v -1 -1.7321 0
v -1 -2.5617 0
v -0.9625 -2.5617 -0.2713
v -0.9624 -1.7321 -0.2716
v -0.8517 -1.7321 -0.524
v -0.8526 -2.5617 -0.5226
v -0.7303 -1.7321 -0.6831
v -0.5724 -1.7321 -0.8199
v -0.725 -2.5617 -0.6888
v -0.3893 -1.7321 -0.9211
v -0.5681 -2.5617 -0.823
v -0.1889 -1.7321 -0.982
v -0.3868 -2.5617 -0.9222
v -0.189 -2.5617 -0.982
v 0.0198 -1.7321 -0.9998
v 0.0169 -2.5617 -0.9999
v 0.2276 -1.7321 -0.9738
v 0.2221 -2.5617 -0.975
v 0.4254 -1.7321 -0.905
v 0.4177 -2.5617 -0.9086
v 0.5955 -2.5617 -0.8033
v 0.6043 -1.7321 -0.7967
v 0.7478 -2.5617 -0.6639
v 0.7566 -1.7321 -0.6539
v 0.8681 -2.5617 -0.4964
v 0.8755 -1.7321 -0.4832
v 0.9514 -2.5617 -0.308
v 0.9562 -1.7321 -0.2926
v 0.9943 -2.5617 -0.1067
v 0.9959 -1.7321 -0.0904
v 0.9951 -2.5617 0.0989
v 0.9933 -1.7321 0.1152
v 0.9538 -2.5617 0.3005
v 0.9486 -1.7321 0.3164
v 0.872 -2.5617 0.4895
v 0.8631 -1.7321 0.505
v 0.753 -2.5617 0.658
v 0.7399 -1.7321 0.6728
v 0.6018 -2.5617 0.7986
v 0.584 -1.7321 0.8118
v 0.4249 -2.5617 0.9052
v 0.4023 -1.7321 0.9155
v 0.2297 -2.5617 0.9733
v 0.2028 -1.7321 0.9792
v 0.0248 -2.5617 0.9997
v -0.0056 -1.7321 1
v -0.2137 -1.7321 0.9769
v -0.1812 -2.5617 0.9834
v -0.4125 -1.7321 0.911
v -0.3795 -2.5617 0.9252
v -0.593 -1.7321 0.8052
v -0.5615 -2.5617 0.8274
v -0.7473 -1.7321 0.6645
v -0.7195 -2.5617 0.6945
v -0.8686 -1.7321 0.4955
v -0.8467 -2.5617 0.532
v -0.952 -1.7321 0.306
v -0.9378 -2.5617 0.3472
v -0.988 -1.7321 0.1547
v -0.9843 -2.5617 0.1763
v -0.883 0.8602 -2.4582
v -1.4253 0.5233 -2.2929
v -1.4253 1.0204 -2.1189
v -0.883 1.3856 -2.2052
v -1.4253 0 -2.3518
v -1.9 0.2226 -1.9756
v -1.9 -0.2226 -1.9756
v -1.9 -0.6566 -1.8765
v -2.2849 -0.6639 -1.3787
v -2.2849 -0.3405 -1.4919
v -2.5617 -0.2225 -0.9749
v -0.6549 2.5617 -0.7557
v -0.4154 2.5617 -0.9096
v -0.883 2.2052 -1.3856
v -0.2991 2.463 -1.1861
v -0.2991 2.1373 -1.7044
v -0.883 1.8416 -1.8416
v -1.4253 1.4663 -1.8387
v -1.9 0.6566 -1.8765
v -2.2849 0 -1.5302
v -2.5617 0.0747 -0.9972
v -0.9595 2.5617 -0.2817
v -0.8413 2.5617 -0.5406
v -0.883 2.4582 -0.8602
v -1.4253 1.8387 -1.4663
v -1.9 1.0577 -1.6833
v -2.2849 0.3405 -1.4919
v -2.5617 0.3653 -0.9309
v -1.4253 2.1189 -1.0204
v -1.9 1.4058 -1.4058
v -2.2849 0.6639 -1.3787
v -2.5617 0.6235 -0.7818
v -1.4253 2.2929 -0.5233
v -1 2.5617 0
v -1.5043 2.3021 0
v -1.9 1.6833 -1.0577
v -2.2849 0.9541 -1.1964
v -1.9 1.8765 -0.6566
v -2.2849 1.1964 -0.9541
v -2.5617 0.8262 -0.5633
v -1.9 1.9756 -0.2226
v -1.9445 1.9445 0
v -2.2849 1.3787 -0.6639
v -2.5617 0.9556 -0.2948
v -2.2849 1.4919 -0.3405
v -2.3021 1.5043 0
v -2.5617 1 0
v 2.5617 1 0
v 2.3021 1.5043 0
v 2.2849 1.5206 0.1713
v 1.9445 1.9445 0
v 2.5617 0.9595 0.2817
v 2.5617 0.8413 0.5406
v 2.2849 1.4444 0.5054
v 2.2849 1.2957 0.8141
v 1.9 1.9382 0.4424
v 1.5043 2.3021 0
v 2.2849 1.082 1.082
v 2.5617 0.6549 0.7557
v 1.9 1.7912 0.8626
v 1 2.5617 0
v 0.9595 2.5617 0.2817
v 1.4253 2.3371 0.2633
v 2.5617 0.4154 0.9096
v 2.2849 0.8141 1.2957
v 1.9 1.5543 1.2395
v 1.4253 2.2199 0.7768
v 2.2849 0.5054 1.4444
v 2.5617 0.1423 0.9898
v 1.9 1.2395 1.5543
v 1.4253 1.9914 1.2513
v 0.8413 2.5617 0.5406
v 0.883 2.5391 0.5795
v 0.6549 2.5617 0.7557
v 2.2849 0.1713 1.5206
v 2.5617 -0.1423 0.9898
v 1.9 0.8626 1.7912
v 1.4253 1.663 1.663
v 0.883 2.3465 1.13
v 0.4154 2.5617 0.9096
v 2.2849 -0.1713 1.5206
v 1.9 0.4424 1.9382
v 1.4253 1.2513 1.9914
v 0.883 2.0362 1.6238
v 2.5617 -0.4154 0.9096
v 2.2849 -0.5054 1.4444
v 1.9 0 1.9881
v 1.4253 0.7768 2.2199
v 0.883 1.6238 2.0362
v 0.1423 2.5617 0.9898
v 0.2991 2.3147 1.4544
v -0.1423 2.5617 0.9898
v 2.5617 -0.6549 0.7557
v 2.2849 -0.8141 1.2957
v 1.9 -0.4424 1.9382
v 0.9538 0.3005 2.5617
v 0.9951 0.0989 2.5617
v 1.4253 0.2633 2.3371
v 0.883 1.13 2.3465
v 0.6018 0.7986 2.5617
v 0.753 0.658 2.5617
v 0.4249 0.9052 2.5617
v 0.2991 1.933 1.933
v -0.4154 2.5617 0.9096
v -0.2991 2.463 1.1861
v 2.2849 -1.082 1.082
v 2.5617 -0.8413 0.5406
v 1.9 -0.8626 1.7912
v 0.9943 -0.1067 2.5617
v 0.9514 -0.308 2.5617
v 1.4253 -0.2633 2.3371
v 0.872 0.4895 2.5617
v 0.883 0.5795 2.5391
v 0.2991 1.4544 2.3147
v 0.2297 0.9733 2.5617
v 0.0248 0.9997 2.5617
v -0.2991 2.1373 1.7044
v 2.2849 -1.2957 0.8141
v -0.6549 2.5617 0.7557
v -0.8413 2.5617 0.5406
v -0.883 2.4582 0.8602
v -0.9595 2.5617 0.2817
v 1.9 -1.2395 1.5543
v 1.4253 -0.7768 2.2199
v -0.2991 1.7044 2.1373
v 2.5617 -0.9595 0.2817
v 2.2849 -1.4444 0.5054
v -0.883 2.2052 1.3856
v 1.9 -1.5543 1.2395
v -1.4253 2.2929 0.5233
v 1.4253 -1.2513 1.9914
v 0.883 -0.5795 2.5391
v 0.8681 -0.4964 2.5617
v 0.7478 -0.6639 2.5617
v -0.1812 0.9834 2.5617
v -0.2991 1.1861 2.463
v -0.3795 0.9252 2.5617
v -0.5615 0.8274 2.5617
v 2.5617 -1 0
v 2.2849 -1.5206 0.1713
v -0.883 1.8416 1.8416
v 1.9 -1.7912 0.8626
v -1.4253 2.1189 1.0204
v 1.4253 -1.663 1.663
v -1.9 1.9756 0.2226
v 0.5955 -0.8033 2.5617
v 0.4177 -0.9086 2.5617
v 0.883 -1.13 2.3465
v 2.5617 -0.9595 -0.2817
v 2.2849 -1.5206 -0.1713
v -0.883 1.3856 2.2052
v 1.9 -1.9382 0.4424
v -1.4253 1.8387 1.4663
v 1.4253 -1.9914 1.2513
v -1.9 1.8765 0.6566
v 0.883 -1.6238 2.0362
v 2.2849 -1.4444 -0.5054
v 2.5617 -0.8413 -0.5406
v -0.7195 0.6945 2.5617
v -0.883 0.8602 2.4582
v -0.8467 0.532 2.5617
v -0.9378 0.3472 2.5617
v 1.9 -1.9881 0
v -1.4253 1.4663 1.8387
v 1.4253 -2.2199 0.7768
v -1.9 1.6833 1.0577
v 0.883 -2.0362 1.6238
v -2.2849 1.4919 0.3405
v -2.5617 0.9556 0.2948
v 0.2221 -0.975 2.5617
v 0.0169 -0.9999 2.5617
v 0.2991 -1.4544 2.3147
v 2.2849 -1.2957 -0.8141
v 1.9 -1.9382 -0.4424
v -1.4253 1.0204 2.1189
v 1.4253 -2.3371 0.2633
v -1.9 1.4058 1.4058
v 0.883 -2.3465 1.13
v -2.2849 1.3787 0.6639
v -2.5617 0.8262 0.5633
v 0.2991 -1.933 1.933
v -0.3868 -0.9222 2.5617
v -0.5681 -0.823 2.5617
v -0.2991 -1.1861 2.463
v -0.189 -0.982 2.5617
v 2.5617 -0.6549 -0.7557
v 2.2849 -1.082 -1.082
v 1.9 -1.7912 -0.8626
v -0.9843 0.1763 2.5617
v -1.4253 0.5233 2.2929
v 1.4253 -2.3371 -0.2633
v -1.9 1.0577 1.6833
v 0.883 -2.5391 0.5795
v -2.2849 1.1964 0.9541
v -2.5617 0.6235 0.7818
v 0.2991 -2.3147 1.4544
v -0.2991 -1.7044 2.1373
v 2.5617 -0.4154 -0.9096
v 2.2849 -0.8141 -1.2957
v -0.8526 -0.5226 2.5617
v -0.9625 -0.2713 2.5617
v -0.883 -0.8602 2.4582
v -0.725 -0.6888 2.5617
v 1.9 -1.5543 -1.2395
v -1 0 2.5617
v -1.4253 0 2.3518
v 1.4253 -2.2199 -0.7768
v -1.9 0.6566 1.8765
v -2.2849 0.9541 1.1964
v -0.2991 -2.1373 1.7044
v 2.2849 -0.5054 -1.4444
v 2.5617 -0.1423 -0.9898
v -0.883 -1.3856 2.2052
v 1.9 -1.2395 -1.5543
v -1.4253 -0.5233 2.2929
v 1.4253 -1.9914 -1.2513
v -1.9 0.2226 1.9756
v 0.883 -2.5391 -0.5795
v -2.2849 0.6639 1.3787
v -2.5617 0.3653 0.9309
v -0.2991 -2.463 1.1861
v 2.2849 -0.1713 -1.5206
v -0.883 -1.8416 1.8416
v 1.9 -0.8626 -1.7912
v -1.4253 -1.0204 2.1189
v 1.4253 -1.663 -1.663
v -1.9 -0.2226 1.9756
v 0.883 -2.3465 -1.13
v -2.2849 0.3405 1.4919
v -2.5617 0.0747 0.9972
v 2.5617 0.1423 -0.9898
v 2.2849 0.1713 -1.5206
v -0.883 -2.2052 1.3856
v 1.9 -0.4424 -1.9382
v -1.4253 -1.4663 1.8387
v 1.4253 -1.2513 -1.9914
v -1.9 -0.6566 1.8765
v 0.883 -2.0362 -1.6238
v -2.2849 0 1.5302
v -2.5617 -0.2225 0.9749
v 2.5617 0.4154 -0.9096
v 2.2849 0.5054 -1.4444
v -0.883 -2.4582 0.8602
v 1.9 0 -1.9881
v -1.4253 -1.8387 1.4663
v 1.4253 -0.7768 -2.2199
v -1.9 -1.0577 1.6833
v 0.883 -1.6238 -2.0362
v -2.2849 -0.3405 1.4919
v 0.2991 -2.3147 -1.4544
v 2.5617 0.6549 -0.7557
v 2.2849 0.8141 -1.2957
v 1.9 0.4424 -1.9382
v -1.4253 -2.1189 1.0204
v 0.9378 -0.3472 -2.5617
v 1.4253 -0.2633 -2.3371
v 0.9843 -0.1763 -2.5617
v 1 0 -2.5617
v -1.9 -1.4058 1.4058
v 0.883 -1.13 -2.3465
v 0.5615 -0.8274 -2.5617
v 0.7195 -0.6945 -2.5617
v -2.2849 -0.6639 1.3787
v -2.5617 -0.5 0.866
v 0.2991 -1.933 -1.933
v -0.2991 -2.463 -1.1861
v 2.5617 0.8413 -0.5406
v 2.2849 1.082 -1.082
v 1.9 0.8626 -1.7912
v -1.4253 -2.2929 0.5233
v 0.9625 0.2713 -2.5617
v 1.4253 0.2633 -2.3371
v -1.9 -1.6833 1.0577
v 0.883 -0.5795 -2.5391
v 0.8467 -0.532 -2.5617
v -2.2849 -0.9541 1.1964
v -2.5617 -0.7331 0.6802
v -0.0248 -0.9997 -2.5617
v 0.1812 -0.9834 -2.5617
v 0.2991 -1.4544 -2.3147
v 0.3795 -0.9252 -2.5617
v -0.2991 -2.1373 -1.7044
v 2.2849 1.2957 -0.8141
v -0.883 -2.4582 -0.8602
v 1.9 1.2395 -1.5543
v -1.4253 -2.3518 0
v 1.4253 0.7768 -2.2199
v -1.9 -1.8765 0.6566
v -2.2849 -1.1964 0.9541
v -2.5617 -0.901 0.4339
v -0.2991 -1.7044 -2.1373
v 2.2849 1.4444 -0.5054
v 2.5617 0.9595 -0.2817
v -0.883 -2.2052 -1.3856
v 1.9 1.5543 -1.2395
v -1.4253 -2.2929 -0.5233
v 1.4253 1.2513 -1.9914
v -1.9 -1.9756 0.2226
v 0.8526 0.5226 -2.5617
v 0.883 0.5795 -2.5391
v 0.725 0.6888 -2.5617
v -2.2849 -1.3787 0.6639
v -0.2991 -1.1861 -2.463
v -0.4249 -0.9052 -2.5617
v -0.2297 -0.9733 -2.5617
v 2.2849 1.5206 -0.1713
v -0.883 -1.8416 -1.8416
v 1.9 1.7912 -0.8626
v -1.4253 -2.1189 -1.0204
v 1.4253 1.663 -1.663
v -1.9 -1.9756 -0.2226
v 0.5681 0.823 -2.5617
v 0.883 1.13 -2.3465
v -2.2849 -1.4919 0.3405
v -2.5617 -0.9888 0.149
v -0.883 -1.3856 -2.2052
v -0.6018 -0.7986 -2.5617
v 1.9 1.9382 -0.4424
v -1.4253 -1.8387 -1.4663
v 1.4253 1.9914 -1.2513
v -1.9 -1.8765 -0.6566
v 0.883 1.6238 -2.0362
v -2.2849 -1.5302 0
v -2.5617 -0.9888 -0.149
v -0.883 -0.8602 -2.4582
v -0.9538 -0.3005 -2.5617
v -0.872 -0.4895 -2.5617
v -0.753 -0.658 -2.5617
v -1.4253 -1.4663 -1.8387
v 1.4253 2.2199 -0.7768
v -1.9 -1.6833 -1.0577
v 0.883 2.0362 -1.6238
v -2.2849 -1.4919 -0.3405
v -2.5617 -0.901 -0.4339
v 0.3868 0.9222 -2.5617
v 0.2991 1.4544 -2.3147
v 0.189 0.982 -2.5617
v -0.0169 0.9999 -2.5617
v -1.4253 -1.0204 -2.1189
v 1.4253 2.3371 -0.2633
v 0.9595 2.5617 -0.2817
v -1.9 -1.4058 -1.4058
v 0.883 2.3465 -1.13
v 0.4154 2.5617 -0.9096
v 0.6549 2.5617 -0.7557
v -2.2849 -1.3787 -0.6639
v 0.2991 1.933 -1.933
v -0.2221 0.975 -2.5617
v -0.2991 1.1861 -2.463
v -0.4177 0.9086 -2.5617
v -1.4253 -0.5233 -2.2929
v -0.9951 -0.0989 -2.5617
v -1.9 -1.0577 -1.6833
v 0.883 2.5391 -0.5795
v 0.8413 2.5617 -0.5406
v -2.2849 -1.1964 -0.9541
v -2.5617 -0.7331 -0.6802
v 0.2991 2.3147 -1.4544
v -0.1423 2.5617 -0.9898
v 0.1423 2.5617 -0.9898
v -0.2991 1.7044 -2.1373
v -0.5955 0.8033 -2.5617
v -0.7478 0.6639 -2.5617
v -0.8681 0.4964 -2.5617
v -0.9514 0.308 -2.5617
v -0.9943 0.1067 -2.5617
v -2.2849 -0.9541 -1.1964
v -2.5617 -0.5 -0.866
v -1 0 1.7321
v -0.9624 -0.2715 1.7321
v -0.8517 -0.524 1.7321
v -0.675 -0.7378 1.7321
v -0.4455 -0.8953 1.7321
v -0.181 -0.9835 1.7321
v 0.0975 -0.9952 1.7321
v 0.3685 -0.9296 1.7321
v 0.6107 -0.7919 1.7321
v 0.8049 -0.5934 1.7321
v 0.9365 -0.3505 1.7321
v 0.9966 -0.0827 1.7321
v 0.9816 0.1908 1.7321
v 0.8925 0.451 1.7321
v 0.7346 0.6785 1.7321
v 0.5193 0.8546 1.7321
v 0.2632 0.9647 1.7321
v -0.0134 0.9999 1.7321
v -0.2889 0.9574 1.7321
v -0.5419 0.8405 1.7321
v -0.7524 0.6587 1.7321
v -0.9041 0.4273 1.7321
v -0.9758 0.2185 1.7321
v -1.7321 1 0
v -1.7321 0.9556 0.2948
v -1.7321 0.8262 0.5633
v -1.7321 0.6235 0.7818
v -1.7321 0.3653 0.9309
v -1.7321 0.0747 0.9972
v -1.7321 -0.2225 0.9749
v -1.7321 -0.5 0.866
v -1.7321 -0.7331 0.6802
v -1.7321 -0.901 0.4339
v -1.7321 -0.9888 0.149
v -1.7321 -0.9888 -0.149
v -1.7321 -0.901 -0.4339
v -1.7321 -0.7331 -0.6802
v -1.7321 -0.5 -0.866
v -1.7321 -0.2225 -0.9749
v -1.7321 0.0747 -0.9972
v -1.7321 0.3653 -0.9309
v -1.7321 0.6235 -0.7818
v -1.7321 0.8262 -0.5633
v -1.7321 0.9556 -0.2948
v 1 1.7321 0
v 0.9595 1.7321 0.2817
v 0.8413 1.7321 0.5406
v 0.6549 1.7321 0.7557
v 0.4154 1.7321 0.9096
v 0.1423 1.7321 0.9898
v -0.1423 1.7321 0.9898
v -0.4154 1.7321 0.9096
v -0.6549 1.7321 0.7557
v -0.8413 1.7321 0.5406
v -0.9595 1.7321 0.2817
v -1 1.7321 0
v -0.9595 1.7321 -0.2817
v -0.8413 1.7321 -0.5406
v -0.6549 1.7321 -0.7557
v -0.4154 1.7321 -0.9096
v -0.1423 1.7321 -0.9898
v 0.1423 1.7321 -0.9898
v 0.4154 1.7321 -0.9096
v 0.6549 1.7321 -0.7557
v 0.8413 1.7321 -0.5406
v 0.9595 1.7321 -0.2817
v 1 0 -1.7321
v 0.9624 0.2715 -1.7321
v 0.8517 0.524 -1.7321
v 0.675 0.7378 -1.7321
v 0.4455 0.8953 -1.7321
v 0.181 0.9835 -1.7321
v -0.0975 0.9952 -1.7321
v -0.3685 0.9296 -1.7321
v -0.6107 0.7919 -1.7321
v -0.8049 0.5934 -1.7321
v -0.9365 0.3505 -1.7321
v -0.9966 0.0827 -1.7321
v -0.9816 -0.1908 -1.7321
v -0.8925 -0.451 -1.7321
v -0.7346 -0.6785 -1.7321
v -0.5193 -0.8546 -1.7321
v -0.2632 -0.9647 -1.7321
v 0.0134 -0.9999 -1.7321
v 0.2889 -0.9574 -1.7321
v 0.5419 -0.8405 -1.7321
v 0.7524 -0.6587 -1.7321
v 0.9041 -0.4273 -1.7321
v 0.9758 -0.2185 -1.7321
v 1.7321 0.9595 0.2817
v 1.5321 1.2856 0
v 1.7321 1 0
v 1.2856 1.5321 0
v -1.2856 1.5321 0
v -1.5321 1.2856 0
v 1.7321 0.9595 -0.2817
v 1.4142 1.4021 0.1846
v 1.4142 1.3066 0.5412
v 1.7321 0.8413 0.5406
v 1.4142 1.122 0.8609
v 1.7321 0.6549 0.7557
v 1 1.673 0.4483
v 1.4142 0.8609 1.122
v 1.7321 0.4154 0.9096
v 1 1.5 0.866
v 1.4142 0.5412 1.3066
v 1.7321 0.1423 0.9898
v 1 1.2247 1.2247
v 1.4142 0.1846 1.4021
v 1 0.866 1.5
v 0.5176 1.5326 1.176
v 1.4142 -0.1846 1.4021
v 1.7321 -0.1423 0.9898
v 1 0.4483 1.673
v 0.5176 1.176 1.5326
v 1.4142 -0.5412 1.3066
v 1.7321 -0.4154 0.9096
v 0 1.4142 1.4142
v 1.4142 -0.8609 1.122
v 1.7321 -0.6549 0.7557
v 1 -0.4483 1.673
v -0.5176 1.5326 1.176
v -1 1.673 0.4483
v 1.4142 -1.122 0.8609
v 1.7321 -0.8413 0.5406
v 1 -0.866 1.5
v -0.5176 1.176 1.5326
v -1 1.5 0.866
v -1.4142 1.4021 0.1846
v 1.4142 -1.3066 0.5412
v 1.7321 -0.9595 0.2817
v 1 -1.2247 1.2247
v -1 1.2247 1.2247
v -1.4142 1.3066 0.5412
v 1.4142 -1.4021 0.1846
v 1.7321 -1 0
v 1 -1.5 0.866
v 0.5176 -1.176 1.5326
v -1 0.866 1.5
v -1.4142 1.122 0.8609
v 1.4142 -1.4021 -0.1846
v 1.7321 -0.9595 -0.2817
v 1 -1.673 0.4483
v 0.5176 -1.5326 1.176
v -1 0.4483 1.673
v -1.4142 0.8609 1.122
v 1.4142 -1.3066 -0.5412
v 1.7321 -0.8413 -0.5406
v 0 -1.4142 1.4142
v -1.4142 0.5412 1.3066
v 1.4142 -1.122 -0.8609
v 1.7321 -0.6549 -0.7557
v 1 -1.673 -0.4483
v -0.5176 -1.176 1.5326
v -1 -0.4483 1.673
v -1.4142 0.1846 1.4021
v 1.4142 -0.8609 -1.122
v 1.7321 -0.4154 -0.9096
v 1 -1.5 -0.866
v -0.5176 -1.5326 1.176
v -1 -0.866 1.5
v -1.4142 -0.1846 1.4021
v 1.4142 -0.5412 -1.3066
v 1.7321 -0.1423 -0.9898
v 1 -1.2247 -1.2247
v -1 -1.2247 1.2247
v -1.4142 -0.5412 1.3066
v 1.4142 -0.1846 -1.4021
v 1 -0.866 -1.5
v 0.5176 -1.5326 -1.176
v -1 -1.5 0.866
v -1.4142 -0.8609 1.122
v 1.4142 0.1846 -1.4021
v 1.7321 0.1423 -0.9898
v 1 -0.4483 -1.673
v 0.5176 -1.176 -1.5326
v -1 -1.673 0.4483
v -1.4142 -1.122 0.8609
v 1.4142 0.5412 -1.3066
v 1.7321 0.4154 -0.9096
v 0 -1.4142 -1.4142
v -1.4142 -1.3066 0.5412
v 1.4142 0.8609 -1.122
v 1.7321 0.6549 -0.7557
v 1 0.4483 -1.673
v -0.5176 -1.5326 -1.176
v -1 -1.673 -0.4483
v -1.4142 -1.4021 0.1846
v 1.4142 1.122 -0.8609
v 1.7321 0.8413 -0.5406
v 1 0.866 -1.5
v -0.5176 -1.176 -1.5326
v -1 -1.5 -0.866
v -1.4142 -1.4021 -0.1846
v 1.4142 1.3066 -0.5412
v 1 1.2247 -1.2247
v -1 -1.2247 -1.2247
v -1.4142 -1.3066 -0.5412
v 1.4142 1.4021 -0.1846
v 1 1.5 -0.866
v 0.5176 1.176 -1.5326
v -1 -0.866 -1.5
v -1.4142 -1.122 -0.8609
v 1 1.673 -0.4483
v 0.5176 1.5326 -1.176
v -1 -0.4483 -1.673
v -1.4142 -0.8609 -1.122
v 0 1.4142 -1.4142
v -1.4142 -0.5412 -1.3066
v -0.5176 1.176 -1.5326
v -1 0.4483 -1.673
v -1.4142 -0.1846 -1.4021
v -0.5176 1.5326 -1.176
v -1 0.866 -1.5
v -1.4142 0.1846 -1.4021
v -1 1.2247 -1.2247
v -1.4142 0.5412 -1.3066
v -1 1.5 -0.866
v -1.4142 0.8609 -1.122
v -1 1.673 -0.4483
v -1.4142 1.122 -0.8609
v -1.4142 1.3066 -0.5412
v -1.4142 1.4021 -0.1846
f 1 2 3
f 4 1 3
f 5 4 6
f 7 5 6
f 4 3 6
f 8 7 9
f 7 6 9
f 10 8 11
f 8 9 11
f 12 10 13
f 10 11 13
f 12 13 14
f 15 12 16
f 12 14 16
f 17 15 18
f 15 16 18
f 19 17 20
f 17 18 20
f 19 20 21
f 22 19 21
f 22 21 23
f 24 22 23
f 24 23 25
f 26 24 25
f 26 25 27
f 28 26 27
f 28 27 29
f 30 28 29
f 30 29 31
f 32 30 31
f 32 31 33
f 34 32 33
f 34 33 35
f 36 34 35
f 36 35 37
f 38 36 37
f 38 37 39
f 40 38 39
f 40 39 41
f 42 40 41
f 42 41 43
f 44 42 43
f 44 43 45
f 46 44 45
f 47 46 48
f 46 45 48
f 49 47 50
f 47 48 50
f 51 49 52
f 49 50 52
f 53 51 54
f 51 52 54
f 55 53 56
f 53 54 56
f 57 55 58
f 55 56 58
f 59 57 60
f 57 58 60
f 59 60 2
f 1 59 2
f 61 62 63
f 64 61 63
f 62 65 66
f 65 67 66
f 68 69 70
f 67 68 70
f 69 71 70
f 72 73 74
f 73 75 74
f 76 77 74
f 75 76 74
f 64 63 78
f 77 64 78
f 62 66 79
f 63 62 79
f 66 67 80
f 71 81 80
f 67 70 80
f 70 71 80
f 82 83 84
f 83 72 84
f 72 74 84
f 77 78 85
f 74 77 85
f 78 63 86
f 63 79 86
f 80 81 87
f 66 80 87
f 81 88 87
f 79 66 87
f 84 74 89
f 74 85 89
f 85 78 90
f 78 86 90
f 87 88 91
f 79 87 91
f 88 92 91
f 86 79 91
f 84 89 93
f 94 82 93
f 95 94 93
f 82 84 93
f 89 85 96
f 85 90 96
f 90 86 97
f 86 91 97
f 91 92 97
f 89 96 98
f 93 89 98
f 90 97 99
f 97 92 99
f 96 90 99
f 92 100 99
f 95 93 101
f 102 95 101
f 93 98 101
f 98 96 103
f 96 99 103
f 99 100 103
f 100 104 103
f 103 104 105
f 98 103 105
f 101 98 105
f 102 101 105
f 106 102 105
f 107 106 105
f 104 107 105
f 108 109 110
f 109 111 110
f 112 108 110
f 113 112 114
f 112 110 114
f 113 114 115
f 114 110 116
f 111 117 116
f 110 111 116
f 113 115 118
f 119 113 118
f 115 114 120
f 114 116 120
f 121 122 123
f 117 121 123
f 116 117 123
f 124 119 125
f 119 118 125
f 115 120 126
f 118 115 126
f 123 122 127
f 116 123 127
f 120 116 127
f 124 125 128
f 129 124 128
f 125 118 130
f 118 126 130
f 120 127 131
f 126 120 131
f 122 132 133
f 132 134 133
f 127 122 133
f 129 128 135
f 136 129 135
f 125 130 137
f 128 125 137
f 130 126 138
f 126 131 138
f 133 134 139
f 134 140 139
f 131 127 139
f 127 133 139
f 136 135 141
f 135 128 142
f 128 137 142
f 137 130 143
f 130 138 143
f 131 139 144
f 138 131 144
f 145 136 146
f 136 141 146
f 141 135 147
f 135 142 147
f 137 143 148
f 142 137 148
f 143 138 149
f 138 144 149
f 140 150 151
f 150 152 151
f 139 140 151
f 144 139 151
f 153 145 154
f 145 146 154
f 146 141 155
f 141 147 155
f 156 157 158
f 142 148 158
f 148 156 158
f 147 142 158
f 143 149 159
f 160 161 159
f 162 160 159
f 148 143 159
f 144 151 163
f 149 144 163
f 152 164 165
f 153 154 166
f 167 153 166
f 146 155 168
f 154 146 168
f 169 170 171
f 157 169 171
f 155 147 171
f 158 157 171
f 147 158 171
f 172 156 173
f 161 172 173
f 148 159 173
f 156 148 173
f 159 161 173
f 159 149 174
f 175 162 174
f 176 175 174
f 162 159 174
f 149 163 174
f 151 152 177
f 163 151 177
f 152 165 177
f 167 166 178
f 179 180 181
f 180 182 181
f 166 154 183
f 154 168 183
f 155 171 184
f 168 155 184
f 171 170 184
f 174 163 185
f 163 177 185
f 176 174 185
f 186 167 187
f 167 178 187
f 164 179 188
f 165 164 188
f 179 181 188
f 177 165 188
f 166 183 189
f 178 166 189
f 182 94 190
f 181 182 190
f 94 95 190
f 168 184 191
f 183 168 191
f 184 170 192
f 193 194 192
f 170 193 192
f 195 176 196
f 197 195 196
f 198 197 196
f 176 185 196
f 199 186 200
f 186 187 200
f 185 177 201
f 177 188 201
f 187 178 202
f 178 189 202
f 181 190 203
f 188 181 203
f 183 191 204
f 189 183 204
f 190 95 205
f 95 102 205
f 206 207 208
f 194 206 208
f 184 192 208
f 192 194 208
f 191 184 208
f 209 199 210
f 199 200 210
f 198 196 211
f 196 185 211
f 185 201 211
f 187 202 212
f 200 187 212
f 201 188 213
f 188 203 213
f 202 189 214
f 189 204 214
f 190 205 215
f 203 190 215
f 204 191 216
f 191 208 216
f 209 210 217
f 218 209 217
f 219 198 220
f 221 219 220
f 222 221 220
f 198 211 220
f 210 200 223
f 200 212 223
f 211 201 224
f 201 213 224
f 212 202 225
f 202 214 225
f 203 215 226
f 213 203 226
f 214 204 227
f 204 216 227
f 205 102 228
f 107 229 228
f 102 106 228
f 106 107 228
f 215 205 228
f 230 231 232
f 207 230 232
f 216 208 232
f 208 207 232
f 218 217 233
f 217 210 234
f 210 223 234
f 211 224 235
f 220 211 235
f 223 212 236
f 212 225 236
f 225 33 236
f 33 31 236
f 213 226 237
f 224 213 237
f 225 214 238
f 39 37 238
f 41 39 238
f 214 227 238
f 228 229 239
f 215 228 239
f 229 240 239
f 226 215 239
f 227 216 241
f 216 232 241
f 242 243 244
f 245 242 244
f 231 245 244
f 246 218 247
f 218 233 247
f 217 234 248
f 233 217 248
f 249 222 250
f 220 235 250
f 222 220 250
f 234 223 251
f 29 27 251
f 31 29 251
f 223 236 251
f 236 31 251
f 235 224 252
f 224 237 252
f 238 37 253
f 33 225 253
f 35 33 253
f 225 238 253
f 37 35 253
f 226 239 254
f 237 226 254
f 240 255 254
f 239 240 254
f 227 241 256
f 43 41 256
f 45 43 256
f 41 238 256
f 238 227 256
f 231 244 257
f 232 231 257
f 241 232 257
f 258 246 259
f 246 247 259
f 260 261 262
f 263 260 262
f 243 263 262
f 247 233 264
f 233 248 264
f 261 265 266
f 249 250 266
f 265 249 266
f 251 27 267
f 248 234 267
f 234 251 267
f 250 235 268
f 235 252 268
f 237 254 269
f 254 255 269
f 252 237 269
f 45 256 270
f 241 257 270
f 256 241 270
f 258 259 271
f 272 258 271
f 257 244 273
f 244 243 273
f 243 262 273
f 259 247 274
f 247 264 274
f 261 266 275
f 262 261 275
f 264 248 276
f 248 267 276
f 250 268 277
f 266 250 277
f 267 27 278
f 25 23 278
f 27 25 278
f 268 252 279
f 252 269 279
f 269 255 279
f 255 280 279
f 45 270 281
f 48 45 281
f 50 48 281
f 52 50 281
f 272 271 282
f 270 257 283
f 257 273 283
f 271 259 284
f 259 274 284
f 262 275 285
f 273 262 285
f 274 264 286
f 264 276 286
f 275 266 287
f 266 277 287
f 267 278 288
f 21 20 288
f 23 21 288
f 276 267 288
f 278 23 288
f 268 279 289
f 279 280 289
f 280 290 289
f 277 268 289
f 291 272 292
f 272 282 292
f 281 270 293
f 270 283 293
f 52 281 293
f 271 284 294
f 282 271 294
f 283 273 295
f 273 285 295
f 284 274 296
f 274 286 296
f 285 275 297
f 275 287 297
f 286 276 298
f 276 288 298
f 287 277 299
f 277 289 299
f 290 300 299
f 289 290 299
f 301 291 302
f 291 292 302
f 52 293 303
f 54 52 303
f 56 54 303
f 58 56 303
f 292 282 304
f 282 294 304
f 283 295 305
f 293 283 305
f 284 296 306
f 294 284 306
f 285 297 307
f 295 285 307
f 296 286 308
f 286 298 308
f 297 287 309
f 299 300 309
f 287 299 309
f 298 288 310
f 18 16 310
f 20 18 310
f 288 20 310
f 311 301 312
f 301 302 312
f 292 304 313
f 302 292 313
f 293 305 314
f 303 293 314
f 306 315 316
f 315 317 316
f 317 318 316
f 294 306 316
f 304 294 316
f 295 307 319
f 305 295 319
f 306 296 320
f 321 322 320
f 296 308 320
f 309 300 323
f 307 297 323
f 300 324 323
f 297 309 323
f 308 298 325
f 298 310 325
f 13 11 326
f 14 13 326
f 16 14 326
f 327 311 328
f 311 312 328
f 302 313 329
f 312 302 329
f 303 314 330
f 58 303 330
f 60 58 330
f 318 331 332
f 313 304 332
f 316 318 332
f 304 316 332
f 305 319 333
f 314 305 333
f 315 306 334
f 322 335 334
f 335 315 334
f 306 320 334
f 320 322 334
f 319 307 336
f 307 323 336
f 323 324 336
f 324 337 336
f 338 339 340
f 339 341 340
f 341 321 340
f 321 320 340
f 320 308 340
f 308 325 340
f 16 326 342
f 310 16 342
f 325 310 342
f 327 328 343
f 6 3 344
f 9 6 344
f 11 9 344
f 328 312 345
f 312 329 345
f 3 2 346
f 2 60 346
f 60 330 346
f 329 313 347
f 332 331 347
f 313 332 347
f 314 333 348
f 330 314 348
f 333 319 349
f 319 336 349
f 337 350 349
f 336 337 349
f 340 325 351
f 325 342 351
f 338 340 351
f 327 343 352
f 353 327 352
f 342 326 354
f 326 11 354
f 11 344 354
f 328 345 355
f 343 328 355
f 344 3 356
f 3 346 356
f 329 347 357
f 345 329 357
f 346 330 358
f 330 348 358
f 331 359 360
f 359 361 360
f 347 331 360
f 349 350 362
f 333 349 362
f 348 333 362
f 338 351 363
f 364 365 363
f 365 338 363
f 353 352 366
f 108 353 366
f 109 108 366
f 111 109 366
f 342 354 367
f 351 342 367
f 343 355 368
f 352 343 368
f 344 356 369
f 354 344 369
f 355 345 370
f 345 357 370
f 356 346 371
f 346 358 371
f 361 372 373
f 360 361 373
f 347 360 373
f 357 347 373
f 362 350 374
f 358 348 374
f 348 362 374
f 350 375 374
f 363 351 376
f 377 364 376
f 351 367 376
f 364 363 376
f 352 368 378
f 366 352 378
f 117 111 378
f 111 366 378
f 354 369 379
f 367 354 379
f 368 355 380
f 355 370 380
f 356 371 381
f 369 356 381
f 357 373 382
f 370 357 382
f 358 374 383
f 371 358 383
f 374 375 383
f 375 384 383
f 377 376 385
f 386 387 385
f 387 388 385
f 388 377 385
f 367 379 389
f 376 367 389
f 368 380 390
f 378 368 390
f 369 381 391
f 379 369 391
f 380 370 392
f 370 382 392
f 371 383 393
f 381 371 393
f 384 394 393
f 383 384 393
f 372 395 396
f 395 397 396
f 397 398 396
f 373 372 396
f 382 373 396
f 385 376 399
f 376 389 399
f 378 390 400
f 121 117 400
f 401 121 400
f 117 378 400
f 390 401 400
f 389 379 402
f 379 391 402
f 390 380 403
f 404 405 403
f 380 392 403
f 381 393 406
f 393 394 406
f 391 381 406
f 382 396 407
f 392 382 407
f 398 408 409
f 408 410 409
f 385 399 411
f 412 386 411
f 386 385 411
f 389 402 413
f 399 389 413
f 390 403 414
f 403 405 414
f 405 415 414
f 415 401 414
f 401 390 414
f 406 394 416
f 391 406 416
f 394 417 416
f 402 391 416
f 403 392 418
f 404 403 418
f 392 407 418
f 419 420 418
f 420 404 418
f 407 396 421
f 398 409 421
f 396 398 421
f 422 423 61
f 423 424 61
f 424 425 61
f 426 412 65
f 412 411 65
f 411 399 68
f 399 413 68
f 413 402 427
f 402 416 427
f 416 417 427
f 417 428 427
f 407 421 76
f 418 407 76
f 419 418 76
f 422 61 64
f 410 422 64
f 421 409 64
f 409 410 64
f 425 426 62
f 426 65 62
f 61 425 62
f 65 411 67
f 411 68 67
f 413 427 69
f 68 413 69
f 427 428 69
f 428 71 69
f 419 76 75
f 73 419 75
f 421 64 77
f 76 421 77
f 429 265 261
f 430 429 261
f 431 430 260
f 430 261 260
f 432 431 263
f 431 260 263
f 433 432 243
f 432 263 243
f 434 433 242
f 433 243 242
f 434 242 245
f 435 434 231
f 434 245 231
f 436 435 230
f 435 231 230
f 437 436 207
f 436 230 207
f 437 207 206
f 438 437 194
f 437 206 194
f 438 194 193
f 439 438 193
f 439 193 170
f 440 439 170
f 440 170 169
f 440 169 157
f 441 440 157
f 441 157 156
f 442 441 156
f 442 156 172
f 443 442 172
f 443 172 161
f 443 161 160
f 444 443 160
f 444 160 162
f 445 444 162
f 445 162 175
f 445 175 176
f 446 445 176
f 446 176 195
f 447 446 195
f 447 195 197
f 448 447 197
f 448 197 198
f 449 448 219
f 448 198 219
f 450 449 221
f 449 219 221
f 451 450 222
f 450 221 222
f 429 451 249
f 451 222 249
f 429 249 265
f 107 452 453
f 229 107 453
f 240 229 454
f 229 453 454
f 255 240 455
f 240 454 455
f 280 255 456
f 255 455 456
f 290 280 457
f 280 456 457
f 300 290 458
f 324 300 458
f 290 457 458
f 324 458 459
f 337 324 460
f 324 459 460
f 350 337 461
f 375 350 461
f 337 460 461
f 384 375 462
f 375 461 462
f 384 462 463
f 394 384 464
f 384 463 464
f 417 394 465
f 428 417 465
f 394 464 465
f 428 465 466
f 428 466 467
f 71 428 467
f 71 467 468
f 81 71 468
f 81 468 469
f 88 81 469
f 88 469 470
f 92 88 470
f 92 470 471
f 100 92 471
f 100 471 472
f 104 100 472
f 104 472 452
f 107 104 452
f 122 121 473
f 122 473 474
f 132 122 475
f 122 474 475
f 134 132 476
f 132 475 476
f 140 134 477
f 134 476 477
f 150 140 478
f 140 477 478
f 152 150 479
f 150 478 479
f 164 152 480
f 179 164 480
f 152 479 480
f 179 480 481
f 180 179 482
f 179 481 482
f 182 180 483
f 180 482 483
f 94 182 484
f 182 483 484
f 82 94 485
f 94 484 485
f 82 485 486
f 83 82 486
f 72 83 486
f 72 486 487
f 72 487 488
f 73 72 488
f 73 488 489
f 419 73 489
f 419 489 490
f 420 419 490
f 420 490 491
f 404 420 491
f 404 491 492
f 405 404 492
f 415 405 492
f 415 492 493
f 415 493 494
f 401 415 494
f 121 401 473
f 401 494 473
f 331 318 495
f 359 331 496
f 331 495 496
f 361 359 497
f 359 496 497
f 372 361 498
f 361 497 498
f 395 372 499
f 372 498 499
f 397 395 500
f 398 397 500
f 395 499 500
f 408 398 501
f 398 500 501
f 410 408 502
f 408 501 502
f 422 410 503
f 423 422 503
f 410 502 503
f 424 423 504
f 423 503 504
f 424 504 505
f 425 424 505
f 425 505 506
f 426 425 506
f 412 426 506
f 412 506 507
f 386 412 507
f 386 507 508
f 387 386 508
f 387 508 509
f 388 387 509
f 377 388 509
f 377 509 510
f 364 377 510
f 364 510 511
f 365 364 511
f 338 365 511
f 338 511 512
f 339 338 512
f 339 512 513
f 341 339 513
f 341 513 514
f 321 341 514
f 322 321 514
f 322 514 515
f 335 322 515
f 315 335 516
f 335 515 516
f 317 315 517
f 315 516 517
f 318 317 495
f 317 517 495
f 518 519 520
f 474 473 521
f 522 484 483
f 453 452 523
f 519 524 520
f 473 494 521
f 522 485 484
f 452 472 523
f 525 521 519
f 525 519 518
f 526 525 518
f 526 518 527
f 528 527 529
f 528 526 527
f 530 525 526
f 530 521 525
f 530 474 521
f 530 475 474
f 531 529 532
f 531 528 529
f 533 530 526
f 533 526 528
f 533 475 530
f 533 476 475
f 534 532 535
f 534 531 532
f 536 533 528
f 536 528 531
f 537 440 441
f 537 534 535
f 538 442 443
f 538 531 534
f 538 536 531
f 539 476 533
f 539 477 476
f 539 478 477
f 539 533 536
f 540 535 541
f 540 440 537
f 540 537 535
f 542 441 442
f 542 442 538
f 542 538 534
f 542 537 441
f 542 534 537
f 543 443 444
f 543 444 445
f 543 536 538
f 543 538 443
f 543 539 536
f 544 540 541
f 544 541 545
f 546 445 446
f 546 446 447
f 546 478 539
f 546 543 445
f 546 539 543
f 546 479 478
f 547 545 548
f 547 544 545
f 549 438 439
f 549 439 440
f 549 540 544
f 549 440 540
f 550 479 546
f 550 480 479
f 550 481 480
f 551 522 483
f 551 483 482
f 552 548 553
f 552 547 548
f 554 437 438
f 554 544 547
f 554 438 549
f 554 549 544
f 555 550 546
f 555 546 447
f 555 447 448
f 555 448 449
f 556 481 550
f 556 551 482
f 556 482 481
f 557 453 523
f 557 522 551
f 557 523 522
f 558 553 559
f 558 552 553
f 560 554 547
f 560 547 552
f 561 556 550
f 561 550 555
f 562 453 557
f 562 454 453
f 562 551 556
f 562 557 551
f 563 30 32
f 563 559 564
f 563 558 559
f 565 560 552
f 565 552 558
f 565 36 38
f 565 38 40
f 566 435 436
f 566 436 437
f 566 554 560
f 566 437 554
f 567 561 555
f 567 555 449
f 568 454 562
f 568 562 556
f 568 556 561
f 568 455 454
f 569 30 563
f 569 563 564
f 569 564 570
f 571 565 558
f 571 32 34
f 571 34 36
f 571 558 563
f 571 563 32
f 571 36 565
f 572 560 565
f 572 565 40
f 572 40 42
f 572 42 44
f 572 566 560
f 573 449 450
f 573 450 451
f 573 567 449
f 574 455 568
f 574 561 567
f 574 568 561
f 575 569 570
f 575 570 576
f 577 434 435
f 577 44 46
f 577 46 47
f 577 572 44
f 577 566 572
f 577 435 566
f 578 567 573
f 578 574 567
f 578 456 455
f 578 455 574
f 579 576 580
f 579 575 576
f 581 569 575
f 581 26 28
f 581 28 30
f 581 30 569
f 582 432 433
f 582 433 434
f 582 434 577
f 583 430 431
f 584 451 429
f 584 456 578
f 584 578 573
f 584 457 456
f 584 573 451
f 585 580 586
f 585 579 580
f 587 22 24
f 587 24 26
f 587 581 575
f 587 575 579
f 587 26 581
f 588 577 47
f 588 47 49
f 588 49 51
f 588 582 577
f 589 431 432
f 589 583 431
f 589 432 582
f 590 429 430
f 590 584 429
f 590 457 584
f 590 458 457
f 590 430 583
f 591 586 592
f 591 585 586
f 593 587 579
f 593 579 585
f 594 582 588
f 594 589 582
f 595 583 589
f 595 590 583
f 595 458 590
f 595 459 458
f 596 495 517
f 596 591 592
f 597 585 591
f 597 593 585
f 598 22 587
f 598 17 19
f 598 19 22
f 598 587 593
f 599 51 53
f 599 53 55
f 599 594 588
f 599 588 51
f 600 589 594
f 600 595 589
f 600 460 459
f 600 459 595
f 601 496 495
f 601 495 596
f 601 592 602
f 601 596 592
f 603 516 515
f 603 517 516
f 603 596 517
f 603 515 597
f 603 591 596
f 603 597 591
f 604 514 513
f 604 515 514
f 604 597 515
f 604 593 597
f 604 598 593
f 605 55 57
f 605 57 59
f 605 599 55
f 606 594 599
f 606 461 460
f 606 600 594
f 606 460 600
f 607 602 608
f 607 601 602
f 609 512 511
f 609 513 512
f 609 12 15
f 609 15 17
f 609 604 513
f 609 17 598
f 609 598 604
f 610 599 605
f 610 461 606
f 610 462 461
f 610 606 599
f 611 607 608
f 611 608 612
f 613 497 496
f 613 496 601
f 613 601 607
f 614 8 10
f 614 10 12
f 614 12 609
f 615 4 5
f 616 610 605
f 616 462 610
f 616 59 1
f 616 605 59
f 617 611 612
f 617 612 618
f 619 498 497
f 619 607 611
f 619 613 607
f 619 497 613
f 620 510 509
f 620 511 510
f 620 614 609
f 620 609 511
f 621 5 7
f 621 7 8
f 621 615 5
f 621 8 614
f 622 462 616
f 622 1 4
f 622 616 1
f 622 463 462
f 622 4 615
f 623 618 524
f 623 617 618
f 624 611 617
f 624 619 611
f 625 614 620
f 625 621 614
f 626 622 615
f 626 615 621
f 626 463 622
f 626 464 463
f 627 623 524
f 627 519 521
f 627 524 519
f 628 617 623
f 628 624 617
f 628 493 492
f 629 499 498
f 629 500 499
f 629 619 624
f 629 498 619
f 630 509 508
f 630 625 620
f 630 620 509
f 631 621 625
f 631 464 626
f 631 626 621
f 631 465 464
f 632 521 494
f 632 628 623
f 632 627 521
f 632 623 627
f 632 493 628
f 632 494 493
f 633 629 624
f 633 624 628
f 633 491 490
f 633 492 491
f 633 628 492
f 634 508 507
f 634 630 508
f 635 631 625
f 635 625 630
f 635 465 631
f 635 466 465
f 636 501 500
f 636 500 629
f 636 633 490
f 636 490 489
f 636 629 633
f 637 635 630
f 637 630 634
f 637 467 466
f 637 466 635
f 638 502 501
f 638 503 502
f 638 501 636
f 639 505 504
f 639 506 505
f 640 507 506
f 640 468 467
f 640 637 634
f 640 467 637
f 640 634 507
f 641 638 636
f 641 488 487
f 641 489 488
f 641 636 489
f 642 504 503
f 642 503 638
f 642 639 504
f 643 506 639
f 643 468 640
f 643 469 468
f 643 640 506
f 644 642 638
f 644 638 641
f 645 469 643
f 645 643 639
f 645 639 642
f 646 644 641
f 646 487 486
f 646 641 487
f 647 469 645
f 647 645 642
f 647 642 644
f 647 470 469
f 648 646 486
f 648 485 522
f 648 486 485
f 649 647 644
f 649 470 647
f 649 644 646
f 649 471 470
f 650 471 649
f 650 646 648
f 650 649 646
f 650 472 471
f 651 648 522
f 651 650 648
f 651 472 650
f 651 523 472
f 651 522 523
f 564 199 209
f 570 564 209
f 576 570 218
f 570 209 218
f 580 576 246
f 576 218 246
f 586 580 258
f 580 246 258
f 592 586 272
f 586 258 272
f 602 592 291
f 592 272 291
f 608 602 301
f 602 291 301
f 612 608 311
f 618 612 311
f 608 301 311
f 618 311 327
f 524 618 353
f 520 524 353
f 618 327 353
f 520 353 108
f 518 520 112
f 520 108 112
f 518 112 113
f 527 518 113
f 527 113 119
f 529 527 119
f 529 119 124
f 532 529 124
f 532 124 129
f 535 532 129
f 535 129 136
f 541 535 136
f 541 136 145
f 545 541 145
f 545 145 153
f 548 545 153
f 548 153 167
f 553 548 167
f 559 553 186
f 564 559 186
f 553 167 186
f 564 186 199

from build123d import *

# Parameters (mm, degrees)
F2_T      = -0.75
F4_D      = 2
F4_DEPTH  = 2.751
F6_D      = 2
F8_D      = 2
F8_DEPTH  = 2.751
F10_D     = 2
F12_D     = 2
F12_DEPTH = 2.751
F14_D     = 2


with BuildPart() as f1:
    # F0 (on Top) → F1 (revolve)
    with BuildSketch(Plane.XY):
        with BuildLine():
            ThreePointArc((2.75, 0), (0, 2.75), (-2.75, 0))
            Line((-2.75, 0), (2.75, 0))
        make_face()
    revolve(axis=Axis((0.1047021379, 0, 0), (1, 0, 0)))

    # F2 (hollow: no face is removed)
    offset(amount=F2_T, mode=Mode.SUBTRACT)

    # F4 (through all, one way)
    with BuildSketch(Plane.XY):
        with Locations((0, 0)):
            Circle(F4_D / 2)
    extrude(amount=-F4_DEPTH, mode=Mode.SUBTRACT)

    # F6 (through all)
    with Locations(Plane(origin=(0, 0, 0), x_dir=(1, 0, 0), z_dir=(0, 0, -1))):
        with Locations((0, 0)):
            Hole(F6_D / 2)

    # F8 (through all, one way)
    with BuildSketch(Plane.YZ):
        with Locations((0, 0)):
            Circle(F8_D / 2)
    extrude(amount=-F8_DEPTH, mode=Mode.SUBTRACT)

    # F10 (through all)
    with Locations(Plane(origin=(0, 0, 0), x_dir=(0, 1, 0), z_dir=(-1, 0, 0))):
        with Locations((0, 0)):
            Hole(F10_D / 2)

    # F12 (through all, one way)
    with BuildSketch(Plane.XZ):
        with Locations((0, 0)):
            Circle(F12_D / 2)
    extrude(amount=-F12_DEPTH, mode=Mode.SUBTRACT)

    # F14 (through all)
    with Locations(Plane(origin=(0, 0, 0), x_dir=(1, 0, 0), z_dir=(0, 1, 0))):
        with Locations((0, 0)):
            Hole(F14_D / 2)


solid = f1.part
